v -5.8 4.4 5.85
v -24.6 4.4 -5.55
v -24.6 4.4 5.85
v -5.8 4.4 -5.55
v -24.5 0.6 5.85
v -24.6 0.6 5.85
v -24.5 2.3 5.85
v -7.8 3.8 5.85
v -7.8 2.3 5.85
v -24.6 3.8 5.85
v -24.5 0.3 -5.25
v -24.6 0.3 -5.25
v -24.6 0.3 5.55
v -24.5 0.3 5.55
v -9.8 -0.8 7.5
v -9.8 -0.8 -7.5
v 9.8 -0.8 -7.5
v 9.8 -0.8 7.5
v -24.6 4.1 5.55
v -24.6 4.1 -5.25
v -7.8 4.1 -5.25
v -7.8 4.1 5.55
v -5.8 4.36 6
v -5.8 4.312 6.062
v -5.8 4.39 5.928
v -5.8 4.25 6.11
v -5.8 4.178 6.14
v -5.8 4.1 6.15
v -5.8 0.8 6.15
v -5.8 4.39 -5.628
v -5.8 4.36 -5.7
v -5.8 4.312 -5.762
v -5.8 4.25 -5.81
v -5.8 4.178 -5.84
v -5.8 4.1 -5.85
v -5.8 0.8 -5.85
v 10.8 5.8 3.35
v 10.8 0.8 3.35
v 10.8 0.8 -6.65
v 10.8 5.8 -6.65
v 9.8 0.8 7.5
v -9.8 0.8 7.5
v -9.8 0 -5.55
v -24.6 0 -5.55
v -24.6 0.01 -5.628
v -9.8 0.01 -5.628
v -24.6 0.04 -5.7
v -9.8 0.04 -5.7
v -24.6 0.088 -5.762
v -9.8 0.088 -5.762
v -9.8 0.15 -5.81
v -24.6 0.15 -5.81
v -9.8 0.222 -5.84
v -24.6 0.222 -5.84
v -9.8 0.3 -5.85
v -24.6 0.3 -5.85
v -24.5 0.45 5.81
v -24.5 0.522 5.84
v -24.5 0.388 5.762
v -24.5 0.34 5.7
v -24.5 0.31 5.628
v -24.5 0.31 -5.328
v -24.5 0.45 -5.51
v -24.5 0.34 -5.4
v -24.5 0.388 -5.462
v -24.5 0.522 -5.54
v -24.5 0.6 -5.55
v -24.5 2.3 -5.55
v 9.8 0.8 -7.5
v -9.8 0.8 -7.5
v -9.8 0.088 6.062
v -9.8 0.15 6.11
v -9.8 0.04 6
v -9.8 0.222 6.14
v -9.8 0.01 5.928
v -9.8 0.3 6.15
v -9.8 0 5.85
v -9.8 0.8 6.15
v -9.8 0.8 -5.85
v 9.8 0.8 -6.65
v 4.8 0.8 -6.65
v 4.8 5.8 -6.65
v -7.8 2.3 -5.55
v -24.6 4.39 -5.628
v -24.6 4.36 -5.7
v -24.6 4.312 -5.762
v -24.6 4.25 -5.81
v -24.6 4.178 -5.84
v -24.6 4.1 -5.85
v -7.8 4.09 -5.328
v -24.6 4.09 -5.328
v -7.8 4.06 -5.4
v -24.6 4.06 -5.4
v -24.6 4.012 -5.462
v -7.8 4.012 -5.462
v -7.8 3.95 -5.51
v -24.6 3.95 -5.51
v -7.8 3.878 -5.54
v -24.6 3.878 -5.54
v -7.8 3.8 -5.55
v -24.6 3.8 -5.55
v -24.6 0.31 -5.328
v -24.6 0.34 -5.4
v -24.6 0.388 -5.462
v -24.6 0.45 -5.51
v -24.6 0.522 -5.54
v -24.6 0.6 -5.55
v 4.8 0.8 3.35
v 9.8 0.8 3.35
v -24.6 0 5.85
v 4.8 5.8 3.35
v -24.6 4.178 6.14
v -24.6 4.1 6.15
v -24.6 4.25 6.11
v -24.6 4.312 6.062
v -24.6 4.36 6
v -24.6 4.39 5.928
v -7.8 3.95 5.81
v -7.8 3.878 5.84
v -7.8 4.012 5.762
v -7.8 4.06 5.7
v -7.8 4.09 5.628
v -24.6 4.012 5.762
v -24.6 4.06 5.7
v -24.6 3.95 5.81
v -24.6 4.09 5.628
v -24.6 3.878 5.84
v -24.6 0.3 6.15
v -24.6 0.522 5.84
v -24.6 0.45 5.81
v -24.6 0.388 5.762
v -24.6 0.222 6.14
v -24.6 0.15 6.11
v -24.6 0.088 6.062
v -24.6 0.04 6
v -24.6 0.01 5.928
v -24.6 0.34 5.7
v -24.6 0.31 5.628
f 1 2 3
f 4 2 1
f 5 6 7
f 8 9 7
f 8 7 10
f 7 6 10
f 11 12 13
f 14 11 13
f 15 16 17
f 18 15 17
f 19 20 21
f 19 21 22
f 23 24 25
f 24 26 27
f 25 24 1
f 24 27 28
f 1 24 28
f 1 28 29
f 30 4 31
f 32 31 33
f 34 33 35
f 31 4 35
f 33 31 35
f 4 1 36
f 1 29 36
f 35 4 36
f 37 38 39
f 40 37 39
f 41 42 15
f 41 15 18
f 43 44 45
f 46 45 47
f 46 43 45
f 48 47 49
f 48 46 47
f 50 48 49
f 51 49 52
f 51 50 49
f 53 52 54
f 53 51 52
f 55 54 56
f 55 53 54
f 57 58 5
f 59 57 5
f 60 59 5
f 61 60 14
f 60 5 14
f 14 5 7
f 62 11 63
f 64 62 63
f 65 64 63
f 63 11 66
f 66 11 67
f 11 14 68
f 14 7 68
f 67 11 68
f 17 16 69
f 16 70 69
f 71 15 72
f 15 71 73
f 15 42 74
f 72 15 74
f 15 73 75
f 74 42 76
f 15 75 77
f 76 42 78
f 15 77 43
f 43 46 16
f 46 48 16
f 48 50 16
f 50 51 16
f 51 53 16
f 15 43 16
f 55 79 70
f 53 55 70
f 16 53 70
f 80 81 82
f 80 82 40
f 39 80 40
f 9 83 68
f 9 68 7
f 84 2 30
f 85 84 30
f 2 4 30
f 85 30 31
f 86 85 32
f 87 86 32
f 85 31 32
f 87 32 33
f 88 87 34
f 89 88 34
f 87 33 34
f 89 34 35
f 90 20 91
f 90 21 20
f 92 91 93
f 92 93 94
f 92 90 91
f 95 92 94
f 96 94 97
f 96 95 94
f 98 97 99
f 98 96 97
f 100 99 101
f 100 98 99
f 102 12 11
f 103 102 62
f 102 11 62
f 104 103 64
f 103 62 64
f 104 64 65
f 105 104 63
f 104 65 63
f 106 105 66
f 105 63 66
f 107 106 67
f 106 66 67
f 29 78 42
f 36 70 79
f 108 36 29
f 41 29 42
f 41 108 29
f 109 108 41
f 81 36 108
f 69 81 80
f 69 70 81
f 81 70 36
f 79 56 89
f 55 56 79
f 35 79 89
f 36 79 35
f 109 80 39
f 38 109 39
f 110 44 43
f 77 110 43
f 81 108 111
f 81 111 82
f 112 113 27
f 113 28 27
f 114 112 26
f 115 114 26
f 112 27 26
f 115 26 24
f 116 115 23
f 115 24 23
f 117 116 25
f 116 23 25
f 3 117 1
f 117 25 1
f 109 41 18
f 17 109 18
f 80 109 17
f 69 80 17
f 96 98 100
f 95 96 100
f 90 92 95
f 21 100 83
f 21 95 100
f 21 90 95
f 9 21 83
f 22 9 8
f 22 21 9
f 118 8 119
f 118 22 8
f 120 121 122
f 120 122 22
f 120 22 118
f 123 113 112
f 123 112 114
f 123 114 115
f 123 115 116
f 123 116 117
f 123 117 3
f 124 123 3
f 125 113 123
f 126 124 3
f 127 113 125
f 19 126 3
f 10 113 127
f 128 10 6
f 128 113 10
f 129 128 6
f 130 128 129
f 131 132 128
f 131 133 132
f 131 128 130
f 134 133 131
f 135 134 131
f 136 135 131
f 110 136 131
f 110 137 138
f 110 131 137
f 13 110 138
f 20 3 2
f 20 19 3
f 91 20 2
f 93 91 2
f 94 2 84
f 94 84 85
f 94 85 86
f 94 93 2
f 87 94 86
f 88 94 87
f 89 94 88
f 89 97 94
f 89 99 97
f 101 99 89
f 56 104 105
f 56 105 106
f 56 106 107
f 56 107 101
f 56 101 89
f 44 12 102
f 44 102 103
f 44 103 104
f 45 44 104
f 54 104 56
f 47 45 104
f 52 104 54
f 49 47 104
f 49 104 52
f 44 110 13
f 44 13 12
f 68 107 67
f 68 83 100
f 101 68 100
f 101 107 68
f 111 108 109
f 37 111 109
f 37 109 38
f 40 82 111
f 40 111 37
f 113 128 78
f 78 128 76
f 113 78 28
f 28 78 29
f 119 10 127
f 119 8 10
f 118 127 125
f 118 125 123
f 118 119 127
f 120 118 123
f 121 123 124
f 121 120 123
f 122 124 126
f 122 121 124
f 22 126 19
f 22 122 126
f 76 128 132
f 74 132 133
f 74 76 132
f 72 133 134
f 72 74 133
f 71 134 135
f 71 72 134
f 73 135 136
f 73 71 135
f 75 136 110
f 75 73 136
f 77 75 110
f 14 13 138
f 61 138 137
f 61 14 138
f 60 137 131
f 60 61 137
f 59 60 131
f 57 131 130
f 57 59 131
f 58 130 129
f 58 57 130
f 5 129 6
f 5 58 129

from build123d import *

# Parameters (mm, degrees)
SKETCH1_W           = 19.6
SKETCH1_H           = 15
BOSS_EXTRUDE1_DEPTH = 0.8
SKETCH2_W           = 18.8
SKETCH2_H           = 12
BOSS_EXTRUDE2_DEPTH = 4.4
SKETCH3_W           = 11.4
SKETCH3_H           = 3.8
CUT_EXTRUDE1_DEPTH  = 16.8
FILLET1_R           = 0.3
SKETCH4_W           = 6
SKETCH4_H           = 10
BOSS_EXTRUDE3_DEPTH = 5
BOSS_EXTRUDE4_DEPTH = 16.7


with BuildPart() as part:
    # Sketch1 → Boss-Extrude1 (new, symmetric)
    with BuildSketch(Plane(origin=(0, 0, 0), x_dir=(1, 0, 0), z_dir=(0, 1, 0))):
        Rectangle(SKETCH1_W, SKETCH1_H)
    extrude(amount=BOSS_EXTRUDE1_DEPTH, both=True)

    # Sketch2 → Boss-Extrude2 (add)
    with BuildSketch(Plane(origin=(0, 0, 0), x_dir=(1, 0, 0), z_dir=(0, 1, 0))):
        with Locations((-15.2, -0.15)):
            Rectangle(SKETCH2_W, SKETCH2_H)
    extrude(amount=BOSS_EXTRUDE2_DEPTH)

    # Sketch3 → Cut-Extrude1 (cut)
    with BuildSketch(Plane.ZY.offset(24.6)):
        with Locations((0.15, 2.2)):
            Rectangle(SKETCH3_W, SKETCH3_H)
    extrude(amount=-CUT_EXTRUDE1_DEPTH, mode=Mode.SUBTRACT)

    # Fillet1
    fillet1_edges = [part.edges().sort_by_distance(p)[0] for p in [
        (-17.2, 0, 6.15),
        (-17.2, 0, -5.85),
        (-15.2, 4.4, 6.15),
        (-15.2, 4.4, -5.85),
        (-16.2, 0.3, 5.85),
        (-16.2, 0.3, -5.55),
        (-16.2, 4.1, -5.55),
        (-16.2, 4.1, 5.85),
    ]]
    fillet(fillet1_edges, radius=FILLET1_R)

    # Sketch4 → Boss-Extrude3 (add)
    with BuildSketch(Plane(origin=(0, 0.8, 0), x_dir=(1, 0, 0), z_dir=(0, 1, 0))):
        with Locations((7.8, 1.65)):
            Rectangle(SKETCH4_W, SKETCH4_H)
    extrude(amount=BOSS_EXTRUDE3_DEPTH)

    # Sketch5 → Boss-Extrude4 (add)
    with BuildSketch(Plane.ZY.offset(7.8)):
        with BuildLine():
            Line((5.55, 0.3), (-5.25, 0.3))
            ThreePointArc((-5.25, 0.3), (-5.462132034, 0.387867966), (-5.55, 0.6))
            Line((-5.55, 0.6), (-5.55, 2.3))
            Line((-5.55, 2.3), (5.85, 2.3))
            Line((5.85, 2.3), (5.85, 0.6))
            ThreePointArc((5.85, 0.6), (5.762132034, 0.387867966), (5.55, 0.3))
        make_face()
    extrude(amount=BOSS_EXTRUDE4_DEPTH)


solid = part.part
